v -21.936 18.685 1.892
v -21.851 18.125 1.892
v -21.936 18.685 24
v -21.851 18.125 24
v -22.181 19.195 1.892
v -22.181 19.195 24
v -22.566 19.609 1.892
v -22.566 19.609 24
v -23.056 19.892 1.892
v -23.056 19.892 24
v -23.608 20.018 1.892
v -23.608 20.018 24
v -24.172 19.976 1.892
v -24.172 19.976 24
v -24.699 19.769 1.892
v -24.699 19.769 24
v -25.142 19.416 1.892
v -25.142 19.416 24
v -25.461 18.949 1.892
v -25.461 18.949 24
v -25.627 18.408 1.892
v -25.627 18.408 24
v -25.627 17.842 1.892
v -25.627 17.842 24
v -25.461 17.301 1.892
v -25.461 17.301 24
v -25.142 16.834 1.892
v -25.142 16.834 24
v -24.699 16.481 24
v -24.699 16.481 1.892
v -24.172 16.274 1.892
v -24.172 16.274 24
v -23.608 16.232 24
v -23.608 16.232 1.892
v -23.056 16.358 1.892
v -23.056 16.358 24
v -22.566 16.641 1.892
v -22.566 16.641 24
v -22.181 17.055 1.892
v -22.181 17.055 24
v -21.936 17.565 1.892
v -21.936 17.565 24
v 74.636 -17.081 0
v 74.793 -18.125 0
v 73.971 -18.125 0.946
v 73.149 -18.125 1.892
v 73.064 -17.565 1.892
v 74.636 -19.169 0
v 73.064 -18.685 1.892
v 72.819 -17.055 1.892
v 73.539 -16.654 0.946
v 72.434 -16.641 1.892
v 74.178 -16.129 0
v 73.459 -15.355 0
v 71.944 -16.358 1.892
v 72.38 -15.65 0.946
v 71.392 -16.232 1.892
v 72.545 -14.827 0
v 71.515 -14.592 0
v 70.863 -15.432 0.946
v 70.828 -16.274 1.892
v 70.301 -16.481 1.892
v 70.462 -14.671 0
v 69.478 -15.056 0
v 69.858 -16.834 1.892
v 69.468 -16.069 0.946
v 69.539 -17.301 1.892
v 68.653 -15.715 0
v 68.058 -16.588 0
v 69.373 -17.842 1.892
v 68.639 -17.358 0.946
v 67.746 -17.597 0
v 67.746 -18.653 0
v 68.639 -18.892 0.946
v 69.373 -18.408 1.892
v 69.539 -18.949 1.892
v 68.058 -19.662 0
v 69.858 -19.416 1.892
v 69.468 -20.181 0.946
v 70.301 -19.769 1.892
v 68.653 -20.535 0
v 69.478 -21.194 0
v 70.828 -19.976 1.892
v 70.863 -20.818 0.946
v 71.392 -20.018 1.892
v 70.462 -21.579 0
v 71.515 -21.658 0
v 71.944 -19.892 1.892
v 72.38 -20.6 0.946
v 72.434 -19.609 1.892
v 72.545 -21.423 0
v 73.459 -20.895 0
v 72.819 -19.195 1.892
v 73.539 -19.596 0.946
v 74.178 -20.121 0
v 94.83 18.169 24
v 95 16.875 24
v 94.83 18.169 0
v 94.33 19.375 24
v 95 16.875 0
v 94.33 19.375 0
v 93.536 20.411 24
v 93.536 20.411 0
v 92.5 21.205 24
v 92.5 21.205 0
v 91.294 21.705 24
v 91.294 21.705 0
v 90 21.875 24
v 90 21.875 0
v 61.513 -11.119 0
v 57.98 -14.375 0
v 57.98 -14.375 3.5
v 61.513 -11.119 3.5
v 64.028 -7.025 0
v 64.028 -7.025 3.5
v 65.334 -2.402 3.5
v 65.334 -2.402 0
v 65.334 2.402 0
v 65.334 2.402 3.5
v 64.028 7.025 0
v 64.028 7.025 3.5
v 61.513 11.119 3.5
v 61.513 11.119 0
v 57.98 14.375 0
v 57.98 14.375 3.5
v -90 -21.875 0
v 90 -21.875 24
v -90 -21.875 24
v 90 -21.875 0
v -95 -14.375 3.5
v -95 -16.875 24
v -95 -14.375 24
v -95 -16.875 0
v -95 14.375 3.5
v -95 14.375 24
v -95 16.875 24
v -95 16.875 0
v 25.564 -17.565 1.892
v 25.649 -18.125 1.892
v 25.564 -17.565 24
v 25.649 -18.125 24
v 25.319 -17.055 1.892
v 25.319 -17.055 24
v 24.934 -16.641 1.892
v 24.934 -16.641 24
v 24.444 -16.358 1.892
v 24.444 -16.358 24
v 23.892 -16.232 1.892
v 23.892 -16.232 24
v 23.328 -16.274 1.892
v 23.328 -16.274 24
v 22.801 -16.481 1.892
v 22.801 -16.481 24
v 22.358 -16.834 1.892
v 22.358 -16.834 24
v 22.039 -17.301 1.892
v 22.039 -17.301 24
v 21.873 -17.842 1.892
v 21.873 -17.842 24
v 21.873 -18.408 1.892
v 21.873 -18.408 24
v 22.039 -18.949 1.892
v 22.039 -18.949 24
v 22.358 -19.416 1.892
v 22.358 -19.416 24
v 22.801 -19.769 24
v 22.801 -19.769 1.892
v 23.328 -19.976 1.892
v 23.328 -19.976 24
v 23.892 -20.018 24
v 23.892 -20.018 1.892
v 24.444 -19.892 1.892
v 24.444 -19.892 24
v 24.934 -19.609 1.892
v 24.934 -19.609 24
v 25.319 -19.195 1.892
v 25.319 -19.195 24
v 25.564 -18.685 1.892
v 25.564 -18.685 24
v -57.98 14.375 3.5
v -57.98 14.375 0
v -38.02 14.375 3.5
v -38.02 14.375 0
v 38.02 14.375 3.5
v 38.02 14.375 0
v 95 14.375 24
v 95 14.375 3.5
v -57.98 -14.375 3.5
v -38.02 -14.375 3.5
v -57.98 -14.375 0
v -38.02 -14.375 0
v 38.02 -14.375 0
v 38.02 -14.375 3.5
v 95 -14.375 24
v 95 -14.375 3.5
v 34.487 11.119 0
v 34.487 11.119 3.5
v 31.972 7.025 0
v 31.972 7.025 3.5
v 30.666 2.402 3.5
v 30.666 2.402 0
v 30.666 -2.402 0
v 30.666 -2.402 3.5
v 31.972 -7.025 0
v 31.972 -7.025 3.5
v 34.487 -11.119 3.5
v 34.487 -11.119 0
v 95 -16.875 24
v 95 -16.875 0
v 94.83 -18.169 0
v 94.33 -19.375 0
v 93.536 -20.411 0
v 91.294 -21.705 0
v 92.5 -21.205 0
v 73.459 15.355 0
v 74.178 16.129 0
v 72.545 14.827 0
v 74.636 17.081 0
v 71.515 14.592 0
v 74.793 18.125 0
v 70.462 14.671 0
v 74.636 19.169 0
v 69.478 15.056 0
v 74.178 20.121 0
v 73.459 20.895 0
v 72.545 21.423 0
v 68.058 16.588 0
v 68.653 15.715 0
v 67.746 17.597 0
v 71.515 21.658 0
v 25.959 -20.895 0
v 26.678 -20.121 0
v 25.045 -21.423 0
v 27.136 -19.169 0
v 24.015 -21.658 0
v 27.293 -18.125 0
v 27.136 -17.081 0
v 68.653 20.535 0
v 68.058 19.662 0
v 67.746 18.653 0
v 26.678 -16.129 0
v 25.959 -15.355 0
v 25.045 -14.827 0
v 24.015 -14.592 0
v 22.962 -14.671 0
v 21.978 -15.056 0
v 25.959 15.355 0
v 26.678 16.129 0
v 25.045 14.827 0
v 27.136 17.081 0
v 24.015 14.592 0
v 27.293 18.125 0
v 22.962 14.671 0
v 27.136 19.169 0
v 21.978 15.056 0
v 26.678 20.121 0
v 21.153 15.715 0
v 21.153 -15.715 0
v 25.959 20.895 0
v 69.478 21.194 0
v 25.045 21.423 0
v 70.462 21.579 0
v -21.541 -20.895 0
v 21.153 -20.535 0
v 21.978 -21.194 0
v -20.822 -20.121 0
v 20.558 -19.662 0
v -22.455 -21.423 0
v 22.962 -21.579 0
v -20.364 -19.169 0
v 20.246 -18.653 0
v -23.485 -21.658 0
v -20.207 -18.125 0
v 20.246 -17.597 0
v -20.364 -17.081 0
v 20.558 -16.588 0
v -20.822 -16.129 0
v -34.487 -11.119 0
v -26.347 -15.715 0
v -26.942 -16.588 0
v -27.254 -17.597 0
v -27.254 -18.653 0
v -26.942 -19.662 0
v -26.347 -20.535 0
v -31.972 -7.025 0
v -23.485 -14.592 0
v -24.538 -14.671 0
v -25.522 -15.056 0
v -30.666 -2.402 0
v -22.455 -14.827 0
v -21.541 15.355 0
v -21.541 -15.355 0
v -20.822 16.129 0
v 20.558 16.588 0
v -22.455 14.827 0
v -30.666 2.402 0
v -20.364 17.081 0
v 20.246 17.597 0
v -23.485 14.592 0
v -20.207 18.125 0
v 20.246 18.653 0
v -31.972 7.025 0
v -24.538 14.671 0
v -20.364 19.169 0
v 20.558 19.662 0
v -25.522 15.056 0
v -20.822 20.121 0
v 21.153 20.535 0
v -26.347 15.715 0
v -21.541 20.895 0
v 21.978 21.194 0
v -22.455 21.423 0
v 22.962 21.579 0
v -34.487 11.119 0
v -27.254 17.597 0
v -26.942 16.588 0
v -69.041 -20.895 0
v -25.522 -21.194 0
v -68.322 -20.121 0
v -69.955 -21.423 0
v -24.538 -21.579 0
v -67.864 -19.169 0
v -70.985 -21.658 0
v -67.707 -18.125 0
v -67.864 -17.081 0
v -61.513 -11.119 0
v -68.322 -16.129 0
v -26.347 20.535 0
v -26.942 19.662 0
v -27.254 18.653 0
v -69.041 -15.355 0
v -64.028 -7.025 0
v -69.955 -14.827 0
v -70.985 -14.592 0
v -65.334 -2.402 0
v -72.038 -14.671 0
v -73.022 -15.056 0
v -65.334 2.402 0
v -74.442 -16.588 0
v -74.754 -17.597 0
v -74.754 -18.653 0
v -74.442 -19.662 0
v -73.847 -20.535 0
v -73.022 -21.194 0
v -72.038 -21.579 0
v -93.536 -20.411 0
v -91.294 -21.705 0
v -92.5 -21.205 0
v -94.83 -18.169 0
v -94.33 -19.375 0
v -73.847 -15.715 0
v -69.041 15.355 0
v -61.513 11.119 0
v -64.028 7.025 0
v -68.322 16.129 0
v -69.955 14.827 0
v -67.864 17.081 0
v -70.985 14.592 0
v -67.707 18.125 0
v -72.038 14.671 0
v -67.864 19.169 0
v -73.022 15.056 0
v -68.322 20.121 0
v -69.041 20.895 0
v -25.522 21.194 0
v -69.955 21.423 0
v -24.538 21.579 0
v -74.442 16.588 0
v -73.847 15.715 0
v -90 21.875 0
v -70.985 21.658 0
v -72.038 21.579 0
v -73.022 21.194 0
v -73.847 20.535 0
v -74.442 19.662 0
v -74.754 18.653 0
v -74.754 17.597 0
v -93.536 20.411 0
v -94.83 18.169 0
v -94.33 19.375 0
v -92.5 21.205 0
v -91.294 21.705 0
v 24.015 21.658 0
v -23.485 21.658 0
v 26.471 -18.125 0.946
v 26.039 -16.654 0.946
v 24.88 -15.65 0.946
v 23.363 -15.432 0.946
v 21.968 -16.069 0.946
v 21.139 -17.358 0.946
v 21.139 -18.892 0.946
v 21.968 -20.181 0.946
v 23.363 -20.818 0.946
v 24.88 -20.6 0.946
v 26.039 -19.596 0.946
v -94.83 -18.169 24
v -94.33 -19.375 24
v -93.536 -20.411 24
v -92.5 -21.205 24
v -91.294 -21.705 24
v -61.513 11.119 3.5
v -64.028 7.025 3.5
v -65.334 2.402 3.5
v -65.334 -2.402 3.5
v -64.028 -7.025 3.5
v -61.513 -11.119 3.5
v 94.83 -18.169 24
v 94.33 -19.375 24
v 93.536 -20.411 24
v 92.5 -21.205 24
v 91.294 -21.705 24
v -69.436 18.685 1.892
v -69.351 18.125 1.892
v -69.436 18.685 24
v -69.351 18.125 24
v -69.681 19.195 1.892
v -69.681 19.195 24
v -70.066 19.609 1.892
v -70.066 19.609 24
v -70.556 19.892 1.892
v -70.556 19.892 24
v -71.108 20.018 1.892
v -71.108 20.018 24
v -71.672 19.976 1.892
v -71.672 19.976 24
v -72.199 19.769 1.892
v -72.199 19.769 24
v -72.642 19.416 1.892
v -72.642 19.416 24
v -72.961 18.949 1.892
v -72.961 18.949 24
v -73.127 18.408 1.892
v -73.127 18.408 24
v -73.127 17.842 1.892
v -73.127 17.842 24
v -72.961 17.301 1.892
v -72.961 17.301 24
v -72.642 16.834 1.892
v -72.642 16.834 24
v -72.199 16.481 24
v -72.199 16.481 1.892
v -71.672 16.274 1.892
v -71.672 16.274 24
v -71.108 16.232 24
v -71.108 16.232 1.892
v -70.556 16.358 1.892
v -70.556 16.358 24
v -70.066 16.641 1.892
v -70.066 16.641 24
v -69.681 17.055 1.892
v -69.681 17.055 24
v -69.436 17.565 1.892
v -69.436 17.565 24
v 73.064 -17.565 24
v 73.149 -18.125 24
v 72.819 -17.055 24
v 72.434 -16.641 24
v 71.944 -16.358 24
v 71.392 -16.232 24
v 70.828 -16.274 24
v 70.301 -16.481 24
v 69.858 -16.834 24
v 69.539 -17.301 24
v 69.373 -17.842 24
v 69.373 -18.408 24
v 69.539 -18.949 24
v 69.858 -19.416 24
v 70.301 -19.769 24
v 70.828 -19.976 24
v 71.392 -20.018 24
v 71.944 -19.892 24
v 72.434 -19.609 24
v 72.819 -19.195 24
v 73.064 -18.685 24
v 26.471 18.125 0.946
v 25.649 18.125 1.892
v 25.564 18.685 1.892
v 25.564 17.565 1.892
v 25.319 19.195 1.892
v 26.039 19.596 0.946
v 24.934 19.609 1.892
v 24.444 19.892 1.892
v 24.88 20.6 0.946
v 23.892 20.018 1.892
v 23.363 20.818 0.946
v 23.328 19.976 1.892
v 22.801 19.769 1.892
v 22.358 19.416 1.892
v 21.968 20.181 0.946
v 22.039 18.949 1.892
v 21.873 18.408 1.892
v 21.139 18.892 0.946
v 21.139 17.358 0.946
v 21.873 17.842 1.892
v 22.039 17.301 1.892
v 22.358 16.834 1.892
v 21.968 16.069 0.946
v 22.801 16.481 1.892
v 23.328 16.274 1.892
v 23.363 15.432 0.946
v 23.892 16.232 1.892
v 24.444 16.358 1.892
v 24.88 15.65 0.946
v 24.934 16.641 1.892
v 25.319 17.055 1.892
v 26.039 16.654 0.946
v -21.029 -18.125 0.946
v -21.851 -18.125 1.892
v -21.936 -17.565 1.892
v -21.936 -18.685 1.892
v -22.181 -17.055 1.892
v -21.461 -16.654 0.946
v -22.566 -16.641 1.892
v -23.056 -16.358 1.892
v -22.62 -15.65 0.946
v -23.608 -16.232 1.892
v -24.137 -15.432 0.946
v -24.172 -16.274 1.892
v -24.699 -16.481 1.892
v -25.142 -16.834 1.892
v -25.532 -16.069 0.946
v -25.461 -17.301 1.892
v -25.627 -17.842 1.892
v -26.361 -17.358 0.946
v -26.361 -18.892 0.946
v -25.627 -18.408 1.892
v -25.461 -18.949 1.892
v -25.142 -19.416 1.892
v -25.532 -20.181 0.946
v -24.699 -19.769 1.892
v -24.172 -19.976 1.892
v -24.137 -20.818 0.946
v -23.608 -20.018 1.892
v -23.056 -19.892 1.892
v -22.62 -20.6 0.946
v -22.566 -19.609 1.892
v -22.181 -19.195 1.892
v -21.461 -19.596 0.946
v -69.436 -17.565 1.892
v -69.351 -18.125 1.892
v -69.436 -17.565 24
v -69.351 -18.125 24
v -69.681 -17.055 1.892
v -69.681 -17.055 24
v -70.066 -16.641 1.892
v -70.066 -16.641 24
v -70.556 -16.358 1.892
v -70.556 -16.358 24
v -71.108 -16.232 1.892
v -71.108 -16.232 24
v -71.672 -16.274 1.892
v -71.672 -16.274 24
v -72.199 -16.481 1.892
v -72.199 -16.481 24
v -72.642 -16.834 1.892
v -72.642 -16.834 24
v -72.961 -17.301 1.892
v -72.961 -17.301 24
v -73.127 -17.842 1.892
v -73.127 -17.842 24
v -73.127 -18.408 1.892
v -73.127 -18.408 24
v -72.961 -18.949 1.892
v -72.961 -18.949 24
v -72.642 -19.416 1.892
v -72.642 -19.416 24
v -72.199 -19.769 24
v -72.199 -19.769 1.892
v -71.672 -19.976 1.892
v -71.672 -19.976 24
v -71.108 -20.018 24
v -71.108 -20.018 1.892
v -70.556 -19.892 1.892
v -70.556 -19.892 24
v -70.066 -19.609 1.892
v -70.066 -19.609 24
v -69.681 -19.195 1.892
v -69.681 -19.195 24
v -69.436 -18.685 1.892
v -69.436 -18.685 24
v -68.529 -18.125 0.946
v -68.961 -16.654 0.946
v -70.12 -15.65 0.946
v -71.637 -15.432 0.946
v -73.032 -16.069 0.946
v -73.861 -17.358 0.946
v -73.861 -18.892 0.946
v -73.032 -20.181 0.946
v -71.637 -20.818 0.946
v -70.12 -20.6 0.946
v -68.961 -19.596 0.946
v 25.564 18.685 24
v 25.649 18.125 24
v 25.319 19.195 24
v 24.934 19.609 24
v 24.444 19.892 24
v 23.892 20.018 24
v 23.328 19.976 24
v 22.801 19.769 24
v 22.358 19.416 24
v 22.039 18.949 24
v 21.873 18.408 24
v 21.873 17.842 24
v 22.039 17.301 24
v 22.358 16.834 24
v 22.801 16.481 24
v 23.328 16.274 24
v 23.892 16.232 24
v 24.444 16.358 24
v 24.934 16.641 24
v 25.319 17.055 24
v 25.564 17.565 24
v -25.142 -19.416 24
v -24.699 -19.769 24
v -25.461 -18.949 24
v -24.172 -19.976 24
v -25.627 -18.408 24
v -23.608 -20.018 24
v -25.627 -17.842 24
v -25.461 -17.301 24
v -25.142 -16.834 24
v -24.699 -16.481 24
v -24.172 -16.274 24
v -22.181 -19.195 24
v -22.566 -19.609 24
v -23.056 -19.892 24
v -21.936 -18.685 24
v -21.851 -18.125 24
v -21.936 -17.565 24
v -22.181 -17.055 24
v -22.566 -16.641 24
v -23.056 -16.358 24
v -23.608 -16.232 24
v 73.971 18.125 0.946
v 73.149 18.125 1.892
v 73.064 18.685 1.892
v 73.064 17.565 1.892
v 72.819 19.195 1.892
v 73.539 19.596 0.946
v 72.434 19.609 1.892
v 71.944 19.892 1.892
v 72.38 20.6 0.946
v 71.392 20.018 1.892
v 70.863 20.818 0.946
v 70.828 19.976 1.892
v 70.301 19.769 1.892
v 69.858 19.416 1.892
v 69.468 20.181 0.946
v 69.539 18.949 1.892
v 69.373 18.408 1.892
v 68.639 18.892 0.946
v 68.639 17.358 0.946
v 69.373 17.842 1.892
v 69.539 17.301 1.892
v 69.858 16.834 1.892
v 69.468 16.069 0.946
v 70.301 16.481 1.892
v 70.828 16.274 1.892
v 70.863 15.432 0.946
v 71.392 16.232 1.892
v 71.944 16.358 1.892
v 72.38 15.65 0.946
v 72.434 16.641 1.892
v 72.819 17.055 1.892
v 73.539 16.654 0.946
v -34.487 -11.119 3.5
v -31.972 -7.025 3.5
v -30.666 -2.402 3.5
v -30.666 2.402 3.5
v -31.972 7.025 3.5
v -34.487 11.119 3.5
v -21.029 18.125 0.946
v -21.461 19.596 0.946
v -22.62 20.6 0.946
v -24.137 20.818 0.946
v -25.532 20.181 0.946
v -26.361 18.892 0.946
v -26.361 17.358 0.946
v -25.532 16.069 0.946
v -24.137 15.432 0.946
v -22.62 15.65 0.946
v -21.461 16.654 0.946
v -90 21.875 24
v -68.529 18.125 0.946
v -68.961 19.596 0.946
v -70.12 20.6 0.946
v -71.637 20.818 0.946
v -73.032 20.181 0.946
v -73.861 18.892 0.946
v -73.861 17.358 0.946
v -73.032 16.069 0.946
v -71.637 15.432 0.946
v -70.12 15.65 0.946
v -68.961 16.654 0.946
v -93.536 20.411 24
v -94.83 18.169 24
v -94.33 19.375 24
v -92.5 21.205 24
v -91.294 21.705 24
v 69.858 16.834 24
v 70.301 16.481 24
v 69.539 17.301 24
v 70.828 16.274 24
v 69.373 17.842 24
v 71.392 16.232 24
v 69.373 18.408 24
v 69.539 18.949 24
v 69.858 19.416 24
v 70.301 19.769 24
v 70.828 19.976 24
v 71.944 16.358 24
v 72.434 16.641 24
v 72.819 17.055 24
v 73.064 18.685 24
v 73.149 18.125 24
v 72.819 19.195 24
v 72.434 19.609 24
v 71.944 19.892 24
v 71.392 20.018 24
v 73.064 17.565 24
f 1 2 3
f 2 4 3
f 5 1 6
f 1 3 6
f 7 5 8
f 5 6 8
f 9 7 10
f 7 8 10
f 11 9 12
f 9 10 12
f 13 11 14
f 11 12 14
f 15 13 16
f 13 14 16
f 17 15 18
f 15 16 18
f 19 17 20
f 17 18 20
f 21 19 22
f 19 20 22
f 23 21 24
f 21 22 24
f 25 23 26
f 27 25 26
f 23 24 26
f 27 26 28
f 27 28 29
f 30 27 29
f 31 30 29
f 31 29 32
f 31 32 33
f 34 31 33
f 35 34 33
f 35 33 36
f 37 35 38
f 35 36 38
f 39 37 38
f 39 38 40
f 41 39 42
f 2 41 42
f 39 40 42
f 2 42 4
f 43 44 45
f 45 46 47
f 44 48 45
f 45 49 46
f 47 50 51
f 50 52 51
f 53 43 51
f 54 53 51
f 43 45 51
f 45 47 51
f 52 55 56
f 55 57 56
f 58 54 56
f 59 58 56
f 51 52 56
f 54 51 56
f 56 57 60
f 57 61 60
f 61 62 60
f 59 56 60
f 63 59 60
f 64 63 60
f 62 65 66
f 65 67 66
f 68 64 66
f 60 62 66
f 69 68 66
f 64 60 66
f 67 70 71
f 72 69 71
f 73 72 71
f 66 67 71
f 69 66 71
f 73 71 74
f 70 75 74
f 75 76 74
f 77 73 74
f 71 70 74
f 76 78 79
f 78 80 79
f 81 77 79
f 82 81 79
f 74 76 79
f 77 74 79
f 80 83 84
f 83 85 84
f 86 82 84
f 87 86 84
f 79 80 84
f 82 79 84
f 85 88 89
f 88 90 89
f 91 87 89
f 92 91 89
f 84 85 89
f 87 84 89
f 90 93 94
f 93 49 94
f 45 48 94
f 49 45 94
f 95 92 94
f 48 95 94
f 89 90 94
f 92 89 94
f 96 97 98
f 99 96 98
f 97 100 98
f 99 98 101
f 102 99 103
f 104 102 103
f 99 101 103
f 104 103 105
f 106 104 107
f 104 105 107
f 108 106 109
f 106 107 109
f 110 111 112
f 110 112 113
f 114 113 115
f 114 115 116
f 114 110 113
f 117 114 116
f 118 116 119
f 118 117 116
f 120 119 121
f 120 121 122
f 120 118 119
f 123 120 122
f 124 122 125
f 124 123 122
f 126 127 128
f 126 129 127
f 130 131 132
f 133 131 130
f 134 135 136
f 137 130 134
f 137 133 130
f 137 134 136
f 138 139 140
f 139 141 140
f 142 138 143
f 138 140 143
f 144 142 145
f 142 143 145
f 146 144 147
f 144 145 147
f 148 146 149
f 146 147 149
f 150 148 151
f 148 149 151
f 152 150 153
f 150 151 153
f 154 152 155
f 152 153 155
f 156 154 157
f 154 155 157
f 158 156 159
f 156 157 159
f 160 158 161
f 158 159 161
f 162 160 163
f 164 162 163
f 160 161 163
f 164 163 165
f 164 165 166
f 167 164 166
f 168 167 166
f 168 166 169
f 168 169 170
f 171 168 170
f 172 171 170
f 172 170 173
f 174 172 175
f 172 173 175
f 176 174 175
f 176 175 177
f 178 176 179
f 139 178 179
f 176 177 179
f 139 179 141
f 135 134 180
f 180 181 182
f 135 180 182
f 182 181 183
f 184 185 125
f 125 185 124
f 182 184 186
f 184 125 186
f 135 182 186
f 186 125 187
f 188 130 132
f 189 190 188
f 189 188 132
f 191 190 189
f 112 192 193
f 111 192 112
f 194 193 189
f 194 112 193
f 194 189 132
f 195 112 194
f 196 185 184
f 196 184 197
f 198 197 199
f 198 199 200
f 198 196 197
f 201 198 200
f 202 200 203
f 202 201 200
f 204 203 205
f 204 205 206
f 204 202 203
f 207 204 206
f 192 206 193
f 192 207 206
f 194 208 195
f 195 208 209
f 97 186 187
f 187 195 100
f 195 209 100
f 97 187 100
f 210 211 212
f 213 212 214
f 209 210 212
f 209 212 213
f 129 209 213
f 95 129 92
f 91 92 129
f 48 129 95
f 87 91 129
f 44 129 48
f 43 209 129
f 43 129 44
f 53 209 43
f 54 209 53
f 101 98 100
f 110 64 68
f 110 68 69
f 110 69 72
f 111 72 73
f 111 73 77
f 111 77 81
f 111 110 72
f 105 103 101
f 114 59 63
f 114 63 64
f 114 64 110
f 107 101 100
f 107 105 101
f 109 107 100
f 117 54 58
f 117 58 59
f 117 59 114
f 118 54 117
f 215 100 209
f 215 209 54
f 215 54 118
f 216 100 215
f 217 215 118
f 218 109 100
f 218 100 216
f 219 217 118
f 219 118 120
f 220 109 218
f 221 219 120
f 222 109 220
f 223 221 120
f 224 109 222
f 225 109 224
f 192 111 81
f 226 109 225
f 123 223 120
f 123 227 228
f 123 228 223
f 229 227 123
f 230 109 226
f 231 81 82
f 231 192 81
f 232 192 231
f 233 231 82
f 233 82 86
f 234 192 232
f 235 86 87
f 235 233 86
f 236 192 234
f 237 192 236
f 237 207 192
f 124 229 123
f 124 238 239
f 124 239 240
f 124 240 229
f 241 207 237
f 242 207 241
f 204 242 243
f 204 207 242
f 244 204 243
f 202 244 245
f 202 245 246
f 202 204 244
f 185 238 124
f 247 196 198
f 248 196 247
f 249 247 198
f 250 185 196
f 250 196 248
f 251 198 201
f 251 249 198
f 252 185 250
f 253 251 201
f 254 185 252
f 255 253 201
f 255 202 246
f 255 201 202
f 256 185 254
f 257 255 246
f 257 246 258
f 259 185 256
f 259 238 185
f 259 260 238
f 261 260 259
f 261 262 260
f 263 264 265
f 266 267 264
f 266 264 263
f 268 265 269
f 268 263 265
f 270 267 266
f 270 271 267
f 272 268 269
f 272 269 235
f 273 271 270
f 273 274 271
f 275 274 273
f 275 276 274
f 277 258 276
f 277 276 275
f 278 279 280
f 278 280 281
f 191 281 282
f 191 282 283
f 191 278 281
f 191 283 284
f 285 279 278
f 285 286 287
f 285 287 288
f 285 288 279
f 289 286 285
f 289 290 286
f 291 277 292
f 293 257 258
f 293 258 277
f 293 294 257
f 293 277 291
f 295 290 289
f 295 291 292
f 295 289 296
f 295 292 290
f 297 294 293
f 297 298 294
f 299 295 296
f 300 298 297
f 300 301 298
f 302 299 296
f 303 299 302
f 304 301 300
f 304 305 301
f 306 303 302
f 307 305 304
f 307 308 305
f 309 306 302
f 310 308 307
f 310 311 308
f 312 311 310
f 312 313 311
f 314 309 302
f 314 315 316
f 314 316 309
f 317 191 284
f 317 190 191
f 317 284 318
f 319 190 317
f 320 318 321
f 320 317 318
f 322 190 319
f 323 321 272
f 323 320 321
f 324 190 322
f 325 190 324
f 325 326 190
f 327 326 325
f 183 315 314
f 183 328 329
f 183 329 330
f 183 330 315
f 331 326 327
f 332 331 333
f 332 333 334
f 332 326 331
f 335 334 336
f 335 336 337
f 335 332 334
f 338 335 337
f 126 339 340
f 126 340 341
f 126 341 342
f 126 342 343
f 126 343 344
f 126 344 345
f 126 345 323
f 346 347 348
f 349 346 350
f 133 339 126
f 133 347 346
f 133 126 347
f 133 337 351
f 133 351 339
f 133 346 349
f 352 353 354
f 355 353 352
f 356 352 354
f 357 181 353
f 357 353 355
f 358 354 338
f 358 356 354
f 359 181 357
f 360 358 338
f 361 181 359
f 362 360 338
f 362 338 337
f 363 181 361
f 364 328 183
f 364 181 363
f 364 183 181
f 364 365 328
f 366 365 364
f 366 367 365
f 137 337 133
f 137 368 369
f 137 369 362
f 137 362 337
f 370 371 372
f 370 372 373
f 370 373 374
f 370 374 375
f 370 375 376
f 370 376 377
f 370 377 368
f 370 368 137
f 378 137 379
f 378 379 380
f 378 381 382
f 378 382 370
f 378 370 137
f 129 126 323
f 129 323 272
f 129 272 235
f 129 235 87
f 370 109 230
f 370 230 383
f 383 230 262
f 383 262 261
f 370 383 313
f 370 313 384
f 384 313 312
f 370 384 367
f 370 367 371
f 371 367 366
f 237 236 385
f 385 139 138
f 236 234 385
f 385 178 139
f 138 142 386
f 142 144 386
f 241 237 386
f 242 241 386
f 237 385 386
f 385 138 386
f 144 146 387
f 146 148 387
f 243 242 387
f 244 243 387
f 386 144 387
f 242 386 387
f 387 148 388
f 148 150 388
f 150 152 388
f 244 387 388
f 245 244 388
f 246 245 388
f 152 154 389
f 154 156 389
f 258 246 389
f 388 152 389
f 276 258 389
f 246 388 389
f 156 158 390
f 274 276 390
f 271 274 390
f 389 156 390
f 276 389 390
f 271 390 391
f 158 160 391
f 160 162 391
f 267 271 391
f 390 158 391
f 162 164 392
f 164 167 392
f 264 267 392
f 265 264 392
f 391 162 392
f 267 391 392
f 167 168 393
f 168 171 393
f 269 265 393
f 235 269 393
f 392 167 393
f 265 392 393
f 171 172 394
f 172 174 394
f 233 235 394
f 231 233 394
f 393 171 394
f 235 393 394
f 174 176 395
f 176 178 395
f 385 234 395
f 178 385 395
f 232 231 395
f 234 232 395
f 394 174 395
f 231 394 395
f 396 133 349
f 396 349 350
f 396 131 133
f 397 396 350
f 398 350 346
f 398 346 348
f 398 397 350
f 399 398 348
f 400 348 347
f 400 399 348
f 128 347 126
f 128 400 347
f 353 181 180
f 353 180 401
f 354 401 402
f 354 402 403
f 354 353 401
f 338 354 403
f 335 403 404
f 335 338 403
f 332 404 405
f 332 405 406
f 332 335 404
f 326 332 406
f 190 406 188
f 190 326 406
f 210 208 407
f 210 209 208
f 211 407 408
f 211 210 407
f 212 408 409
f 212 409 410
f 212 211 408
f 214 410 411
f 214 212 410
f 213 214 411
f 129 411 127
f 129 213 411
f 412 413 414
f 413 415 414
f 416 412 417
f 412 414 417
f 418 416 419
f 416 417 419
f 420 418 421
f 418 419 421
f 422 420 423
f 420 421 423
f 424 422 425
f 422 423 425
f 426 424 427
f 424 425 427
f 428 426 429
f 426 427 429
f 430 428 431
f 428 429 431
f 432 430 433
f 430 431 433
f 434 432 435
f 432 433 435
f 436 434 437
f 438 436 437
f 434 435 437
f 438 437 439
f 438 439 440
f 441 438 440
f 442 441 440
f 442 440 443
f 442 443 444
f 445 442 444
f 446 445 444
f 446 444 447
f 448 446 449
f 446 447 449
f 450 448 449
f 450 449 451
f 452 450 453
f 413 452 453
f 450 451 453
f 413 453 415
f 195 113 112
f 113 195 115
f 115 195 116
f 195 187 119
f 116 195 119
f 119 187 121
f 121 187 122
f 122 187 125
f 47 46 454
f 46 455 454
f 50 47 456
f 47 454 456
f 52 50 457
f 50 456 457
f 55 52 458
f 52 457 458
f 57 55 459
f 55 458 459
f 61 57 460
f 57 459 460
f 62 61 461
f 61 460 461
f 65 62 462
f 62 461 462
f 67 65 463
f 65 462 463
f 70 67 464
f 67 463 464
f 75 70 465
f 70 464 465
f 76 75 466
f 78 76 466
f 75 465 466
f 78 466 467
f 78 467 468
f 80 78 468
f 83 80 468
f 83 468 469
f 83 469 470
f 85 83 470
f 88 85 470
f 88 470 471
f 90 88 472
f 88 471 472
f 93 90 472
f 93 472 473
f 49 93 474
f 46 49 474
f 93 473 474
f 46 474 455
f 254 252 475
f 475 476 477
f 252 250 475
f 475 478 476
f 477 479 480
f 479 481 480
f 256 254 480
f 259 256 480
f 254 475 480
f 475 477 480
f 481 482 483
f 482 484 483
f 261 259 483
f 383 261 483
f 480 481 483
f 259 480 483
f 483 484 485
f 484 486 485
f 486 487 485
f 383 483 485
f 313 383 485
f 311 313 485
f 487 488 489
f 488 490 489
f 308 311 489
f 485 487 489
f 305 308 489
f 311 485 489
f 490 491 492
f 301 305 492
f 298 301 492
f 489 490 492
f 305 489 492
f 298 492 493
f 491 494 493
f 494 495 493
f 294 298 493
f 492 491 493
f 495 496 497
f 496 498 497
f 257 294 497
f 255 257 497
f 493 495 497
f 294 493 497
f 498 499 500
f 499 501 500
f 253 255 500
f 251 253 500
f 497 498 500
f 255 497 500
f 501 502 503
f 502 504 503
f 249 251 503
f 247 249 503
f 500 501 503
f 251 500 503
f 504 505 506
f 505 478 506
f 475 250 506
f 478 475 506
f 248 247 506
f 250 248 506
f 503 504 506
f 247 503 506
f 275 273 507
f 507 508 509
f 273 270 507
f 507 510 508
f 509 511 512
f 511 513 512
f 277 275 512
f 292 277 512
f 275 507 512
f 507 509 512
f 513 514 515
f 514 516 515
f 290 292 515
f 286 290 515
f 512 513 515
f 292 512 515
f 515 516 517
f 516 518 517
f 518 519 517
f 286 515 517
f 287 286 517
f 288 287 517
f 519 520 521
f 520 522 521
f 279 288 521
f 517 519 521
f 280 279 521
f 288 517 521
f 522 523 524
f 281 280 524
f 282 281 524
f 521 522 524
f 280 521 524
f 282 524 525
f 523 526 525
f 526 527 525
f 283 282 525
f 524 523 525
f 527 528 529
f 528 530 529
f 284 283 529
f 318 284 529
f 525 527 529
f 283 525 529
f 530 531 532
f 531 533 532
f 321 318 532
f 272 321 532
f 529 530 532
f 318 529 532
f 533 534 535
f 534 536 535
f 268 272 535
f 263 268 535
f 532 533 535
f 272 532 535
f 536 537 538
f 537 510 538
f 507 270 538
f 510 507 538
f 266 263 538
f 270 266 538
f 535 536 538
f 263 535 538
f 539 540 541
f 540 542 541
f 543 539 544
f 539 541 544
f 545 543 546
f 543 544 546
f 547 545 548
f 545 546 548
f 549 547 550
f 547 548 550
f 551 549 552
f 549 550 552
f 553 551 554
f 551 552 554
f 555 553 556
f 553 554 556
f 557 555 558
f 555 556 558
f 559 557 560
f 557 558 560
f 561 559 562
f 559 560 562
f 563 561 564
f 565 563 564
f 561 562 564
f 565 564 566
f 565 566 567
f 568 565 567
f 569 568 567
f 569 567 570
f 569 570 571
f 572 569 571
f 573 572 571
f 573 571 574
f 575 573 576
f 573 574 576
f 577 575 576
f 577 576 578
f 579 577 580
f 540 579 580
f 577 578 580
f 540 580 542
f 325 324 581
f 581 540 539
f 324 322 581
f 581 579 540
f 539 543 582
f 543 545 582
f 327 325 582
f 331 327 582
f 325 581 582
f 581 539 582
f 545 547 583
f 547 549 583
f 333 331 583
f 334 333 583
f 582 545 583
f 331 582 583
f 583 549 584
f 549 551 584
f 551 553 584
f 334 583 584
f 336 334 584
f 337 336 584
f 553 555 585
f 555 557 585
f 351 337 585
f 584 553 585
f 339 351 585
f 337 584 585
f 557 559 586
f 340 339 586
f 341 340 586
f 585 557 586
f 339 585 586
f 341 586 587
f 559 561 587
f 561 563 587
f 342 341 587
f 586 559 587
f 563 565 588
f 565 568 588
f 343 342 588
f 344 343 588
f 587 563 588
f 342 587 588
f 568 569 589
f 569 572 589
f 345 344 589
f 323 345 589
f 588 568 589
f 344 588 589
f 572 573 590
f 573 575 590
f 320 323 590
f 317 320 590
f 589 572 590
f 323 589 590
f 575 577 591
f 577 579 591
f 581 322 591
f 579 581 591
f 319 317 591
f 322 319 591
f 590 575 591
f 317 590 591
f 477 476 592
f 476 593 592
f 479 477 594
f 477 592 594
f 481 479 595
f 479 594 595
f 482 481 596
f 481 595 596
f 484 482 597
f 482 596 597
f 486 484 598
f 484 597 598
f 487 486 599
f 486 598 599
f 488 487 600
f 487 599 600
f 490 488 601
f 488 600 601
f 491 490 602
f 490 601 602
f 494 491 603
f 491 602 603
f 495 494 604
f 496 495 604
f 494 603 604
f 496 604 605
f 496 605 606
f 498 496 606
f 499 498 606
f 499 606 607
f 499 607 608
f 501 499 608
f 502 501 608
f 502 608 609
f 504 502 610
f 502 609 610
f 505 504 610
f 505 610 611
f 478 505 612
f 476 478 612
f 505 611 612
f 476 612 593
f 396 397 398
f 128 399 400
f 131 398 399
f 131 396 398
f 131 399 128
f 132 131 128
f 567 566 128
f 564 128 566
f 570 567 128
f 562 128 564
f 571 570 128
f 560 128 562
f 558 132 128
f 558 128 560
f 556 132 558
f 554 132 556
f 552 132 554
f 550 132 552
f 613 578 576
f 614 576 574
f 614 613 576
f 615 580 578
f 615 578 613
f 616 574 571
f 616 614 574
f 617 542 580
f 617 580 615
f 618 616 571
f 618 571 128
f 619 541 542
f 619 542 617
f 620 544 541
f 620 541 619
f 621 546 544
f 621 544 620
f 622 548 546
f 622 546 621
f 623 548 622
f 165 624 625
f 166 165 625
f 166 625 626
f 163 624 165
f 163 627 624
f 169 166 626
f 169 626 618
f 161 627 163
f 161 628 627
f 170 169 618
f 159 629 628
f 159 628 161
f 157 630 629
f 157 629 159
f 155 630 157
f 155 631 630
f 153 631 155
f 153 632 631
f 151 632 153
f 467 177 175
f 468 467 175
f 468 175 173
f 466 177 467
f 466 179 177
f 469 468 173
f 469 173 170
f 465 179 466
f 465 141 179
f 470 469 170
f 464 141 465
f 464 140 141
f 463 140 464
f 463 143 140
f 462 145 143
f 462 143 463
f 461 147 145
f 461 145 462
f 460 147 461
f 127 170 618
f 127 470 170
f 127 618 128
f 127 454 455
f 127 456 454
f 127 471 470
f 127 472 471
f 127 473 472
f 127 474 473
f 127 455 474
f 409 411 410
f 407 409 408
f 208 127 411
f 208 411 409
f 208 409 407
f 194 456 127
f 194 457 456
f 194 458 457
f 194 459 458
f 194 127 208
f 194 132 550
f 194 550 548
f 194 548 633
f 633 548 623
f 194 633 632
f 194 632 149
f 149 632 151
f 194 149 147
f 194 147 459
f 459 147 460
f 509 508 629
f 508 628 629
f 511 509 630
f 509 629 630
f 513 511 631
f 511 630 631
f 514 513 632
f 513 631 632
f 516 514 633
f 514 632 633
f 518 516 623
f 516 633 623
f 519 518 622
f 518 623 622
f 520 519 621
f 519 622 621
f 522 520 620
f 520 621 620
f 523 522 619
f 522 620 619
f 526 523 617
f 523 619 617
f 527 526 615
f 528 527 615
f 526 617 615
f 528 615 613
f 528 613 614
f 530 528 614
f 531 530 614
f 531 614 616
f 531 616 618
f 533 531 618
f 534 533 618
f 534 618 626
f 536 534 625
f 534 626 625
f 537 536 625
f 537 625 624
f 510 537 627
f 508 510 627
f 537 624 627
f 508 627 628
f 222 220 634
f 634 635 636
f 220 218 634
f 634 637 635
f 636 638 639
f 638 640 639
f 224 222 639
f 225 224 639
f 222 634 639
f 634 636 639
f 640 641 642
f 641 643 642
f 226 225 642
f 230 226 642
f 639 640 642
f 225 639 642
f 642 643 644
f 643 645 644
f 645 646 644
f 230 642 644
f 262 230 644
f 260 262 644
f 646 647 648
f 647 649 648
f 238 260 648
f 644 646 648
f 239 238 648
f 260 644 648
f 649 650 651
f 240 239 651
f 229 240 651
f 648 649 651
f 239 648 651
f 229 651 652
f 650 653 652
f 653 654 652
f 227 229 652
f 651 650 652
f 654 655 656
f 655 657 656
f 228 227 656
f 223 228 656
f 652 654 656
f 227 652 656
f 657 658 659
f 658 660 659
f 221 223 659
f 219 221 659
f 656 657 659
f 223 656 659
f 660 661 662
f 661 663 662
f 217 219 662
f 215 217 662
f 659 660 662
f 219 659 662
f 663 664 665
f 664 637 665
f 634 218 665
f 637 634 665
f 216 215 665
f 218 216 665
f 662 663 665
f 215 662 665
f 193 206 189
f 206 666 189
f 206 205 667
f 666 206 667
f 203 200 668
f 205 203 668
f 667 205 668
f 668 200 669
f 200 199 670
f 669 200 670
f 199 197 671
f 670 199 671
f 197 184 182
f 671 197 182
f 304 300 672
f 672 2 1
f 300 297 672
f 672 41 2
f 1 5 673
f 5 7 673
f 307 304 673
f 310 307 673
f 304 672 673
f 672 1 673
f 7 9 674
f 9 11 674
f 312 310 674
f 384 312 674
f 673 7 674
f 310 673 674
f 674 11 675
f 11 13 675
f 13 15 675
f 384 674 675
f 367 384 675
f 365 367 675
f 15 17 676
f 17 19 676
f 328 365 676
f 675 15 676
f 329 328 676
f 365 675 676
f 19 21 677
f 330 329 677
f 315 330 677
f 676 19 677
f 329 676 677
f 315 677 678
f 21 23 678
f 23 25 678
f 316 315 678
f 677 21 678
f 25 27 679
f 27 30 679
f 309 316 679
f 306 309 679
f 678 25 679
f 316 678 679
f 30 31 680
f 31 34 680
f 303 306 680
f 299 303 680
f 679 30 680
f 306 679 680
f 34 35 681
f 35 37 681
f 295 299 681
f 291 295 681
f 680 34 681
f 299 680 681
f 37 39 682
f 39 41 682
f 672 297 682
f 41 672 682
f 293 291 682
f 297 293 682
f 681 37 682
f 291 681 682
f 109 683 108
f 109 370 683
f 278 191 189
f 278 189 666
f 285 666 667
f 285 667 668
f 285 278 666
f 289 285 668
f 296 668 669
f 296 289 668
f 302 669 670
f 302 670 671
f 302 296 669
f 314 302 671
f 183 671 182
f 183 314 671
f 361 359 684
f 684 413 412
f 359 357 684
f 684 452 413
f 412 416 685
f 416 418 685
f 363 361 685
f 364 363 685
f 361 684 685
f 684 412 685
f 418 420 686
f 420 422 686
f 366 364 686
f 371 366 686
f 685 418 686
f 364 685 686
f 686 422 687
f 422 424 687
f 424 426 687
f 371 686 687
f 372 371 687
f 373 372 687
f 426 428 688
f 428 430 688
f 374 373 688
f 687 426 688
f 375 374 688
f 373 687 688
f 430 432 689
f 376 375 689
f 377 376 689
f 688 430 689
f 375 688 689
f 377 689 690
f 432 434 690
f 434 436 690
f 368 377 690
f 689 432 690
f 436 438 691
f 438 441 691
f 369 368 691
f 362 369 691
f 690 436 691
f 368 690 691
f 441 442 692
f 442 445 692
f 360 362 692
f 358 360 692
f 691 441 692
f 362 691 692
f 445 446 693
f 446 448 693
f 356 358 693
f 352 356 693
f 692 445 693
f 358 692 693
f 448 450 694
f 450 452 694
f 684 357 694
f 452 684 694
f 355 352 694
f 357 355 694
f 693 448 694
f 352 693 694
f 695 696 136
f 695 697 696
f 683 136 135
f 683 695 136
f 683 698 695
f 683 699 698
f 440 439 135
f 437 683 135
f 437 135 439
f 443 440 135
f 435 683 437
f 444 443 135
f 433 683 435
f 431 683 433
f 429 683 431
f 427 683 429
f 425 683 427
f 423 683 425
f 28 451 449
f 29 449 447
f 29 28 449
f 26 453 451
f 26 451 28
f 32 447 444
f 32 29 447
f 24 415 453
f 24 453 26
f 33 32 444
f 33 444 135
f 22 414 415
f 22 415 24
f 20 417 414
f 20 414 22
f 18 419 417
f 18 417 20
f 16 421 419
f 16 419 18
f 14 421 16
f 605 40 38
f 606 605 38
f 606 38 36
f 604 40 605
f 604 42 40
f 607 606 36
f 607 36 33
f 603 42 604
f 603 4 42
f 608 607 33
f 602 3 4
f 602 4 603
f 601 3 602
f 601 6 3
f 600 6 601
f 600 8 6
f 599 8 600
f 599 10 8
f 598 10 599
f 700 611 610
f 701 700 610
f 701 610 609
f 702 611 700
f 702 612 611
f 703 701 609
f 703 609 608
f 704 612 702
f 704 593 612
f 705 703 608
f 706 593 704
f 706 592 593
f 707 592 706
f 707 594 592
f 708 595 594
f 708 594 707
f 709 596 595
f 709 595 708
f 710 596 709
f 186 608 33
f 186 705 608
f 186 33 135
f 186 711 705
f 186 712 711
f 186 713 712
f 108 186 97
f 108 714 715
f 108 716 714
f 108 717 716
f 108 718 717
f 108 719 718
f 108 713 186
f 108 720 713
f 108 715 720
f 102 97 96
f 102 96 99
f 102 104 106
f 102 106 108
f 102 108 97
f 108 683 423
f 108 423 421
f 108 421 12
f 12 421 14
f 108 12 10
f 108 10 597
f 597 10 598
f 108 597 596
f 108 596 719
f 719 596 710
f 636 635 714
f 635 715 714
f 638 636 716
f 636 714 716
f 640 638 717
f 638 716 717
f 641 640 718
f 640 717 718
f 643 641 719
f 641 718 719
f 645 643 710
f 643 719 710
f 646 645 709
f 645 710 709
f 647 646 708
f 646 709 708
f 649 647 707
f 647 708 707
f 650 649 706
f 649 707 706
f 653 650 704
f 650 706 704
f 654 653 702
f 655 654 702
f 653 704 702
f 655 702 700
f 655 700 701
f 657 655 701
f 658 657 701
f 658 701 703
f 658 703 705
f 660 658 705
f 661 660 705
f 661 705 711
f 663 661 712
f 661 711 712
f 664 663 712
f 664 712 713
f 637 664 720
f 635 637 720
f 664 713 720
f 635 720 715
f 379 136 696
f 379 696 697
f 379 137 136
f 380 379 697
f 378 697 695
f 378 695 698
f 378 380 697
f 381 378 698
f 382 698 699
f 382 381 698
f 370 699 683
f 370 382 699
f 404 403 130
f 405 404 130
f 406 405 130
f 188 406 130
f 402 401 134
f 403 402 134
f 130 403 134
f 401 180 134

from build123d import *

# Parameters (mm, degrees)
BOSS_EXTRUDE4_DEPTH                            = 3.5
SKETCH6_W                                      = 190
SKETCH6_H                                      = 7.5
BOSS_EXTRUDE5_DEPTH                            = 20.5
CSK_FOR_6_FLAT_HEAD_MACHINE_SCREW1_D           = 3.7973
CSK_FOR_6_FLAT_HEAD_MACHINE_SCREW1_CSINK_D     = 7.0866
CSK_FOR_6_FLAT_HEAD_MACHINE_SCREW1_CSINK_ANGLE = 82
FILLET1_R                                      = 5


with BuildPart() as part:
    # Sketch5 → Boss-Extrude4 (new body)
    with BuildSketch(Plane.XY):
        Polygon((95, 21.875), (95, 14.375), (95, -14.375), (95, -21.875), (-95, -21.875), (-95, -14.375), (-95, 14.375), (-95, 21.875), align=None)
        with BuildLine():
            Line((57.980449639, 14.375), (38.019550361, 14.375))
            ThreePointArc((38.019550361, 14.375), (30.5, 0), (38.019550361, -14.375))
            Line((38.019550361, -14.375), (57.980449639, -14.375))
            ThreePointArc((57.980449639, -14.375), (65.5, 0), (57.980449639, 14.375))
        make_face(mode=Mode.SUBTRACT)
        with BuildLine():
            Line((-57.980449639, -14.375), (-38.019550361, -14.375))
            ThreePointArc((-38.019550361, -14.375), (-30.5, 0), (-38.019550361, 14.375))
            Line((-38.019550361, 14.375), (-57.980449639, 14.375))
            ThreePointArc((-57.980449639, 14.375), (-65.5, 0), (-57.980449639, -14.375))
        make_face(mode=Mode.SUBTRACT)
    extrude(amount=BOSS_EXTRUDE4_DEPTH)

    # Sketch6 → Boss-Extrude5 (add)
    with BuildSketch(Plane.XY.offset(3.5)):
        with Locations((0, 18.125)):
            Rectangle(SKETCH6_W, SKETCH6_H)
        with Locations((0, -18.125)):
            Rectangle(SKETCH6_W, SKETCH6_H)
    extrude(amount=BOSS_EXTRUDE5_DEPTH)

    # CSK for #6 Flat Head Machine Screw1 (through all)
    with Locations(Plane(origin=(0, 0, 0), x_dir=(-1, 0, 0), z_dir=(0, 0, -1))):
        with Locations((71.25, 18.125), (23.75, 18.125), (-23.75, 18.125), (-71.25, 18.125), (71.25, -18.125), (23.75, -18.125), (-23.75, -18.125), (-71.25, -18.125)):
            CounterSinkHole(CSK_FOR_6_FLAT_HEAD_MACHINE_SCREW1_D / 2, CSK_FOR_6_FLAT_HEAD_MACHINE_SCREW1_CSINK_D / 2, counter_sink_angle=CSK_FOR_6_FLAT_HEAD_MACHINE_SCREW1_CSINK_ANGLE)

    # Fillet1
    fillet1_edges = [part.edges().sort_by_distance(p)[0] for p in [
        (95, 21.875, 12),
        (95, -21.875, 12),
        (-95, -21.875, 12),
        (-95, 21.875, 12),
    ]]
    fillet(fillet1_edges, radius=FILLET1_R)


solid = part.part
